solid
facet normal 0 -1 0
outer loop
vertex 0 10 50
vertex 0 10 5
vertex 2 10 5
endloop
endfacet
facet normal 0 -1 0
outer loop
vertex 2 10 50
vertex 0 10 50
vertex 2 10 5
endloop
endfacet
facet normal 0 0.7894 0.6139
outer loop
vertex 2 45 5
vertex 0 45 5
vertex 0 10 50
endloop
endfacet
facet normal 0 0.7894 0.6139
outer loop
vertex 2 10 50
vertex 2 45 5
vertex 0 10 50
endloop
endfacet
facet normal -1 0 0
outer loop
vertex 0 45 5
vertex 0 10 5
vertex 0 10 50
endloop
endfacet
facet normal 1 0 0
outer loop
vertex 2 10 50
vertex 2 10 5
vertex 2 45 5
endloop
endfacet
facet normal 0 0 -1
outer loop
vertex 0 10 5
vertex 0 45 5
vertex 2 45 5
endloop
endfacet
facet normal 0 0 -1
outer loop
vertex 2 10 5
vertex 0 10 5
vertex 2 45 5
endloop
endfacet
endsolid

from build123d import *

# Parameters (mm, degrees)
EXTRUDE002_DEPTH = 2
SKETCH003_W      = 2
SKETCH003_H      = 35
EXTRUDE001_DEPTH = 45


with BuildPart() as extrude002:
    # Sketch004 (on Face1 of CopyExtrude001) → Extrude002 (new body)
    with BuildSketch(Plane(origin=(0, 0, 0), x_dir=(0, -1, 0), z_dir=(-1, 0, 0))):
        Polygon((-45, 5), (-10, 50), (-45, 50), align=None)
    extrude(amount=-EXTRUDE002_DEPTH)


with BuildPart() as cut001:
    # Sketch003 (on Face1 of CopyCut) → Extrude001 (new body)
    with BuildSketch(Plane.XY.offset(5)):
        with Locations((1, 27.5)):
            Rectangle(SKETCH003_W, SKETCH003_H)
    extrude(amount=EXTRUDE001_DEPTH)

    # Cut001: cut Extrude002
    add(extrude002.part, mode=Mode.SUBTRACT)


solid = cut001.part
